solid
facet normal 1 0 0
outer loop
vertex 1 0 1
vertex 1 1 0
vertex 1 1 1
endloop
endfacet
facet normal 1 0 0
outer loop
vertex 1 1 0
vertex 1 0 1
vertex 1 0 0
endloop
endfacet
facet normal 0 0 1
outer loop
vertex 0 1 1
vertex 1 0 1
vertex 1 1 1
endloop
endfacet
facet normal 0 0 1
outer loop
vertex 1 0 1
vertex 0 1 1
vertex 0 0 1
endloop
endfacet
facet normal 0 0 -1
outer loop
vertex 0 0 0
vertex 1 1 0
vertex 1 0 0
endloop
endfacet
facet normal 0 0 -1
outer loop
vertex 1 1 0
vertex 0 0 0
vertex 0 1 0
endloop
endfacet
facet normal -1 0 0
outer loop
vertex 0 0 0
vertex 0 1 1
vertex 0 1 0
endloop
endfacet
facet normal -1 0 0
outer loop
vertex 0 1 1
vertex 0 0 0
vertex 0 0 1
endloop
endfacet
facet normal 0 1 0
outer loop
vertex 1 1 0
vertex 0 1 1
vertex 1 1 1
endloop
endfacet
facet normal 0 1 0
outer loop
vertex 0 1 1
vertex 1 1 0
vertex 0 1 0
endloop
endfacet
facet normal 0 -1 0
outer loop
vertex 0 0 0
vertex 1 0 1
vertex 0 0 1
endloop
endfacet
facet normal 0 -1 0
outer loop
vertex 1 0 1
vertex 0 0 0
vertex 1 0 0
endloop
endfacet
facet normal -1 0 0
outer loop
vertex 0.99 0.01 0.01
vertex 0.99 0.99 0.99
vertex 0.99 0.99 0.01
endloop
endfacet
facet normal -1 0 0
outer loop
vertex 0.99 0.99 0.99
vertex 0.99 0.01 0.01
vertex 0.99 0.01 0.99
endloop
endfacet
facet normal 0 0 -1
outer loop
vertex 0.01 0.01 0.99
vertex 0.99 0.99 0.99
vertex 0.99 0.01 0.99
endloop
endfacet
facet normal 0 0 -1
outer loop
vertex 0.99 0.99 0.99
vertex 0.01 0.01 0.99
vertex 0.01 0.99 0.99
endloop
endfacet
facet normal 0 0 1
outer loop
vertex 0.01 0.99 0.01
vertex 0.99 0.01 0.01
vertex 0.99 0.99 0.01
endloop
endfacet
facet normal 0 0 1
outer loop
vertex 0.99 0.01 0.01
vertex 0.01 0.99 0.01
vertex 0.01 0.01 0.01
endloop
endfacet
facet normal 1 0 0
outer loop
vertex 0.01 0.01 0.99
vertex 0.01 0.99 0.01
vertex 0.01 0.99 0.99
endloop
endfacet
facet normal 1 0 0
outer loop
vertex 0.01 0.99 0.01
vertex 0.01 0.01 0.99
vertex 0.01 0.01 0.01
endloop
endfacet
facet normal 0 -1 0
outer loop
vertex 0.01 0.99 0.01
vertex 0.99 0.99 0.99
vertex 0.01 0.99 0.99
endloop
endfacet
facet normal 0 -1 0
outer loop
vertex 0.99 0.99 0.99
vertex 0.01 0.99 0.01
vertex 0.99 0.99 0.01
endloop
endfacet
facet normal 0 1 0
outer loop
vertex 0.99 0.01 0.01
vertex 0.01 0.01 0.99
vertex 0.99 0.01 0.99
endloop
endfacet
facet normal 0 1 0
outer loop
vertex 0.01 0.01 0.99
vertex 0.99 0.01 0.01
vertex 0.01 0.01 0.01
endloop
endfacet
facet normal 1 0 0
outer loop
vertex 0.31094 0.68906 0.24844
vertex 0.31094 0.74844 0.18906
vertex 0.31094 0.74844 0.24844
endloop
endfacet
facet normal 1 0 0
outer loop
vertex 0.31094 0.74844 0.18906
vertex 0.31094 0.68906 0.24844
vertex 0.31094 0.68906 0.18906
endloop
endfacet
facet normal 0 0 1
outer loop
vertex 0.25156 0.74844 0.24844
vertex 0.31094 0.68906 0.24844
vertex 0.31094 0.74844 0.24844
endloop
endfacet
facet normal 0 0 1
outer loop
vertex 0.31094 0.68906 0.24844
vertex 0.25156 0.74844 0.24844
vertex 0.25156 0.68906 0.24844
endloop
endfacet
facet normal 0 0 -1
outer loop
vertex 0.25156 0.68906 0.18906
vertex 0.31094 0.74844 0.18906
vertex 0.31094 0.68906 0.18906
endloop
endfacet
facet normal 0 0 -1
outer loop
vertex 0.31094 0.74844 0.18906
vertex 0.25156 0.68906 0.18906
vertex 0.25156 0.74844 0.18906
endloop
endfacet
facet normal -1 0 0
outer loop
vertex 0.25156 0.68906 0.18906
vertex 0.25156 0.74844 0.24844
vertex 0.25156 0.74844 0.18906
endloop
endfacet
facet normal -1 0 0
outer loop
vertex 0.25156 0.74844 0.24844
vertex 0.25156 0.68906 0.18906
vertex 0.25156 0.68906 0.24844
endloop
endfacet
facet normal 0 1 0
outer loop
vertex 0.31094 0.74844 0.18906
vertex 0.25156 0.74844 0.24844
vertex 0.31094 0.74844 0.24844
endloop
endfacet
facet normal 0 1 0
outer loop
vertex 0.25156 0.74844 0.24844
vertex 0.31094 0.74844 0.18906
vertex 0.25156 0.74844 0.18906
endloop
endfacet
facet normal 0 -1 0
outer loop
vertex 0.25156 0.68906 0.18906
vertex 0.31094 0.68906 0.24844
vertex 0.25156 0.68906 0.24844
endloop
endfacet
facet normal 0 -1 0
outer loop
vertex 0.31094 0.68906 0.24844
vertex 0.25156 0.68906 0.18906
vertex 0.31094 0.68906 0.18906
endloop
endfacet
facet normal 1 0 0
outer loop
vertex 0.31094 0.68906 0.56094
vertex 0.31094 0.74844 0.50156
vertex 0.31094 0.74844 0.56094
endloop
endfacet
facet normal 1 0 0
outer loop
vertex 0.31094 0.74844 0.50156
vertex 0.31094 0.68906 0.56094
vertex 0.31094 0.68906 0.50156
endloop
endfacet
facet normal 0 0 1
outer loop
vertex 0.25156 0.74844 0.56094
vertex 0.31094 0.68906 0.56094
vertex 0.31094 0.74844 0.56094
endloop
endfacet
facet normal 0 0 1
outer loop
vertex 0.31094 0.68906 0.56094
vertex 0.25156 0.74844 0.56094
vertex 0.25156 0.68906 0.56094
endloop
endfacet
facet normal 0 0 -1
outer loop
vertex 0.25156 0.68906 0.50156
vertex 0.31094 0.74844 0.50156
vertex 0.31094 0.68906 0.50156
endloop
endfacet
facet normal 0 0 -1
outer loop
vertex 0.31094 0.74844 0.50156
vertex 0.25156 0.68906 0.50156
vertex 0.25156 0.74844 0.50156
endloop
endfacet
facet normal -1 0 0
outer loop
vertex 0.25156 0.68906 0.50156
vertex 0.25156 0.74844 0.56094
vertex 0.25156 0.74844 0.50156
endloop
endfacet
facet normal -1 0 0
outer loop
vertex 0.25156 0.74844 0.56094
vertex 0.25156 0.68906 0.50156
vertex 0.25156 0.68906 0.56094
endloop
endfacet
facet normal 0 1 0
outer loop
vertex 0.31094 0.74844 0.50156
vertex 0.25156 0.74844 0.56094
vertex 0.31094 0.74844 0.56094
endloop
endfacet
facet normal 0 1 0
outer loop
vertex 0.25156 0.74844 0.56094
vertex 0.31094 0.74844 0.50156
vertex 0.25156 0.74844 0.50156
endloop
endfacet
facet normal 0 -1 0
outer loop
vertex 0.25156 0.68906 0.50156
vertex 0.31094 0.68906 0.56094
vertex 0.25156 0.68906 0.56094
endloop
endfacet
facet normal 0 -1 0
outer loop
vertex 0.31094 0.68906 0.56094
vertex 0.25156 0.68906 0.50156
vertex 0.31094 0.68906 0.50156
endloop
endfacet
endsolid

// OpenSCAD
translate([0.28125, 0.71875, 0.21875]) color([0.036232652144622346, 0.8429466862027815, 0.4403077419155166]) cube([0.059375, 0.059375, 0.059375], center=true);
translate([0.28125, 0.71875, 0.53125]) color([0.03635482249582389, 0.5551045949357722, 0.15116566323689118]) cube([0.059375, 0.059375, 0.059375], center=true);
color([0.3,0.3,0.3,0.3]) difference() { cube([1,1,1]); translate([0.01,0.01,0.01]) cube([0.98,0.98,0.98]); }
